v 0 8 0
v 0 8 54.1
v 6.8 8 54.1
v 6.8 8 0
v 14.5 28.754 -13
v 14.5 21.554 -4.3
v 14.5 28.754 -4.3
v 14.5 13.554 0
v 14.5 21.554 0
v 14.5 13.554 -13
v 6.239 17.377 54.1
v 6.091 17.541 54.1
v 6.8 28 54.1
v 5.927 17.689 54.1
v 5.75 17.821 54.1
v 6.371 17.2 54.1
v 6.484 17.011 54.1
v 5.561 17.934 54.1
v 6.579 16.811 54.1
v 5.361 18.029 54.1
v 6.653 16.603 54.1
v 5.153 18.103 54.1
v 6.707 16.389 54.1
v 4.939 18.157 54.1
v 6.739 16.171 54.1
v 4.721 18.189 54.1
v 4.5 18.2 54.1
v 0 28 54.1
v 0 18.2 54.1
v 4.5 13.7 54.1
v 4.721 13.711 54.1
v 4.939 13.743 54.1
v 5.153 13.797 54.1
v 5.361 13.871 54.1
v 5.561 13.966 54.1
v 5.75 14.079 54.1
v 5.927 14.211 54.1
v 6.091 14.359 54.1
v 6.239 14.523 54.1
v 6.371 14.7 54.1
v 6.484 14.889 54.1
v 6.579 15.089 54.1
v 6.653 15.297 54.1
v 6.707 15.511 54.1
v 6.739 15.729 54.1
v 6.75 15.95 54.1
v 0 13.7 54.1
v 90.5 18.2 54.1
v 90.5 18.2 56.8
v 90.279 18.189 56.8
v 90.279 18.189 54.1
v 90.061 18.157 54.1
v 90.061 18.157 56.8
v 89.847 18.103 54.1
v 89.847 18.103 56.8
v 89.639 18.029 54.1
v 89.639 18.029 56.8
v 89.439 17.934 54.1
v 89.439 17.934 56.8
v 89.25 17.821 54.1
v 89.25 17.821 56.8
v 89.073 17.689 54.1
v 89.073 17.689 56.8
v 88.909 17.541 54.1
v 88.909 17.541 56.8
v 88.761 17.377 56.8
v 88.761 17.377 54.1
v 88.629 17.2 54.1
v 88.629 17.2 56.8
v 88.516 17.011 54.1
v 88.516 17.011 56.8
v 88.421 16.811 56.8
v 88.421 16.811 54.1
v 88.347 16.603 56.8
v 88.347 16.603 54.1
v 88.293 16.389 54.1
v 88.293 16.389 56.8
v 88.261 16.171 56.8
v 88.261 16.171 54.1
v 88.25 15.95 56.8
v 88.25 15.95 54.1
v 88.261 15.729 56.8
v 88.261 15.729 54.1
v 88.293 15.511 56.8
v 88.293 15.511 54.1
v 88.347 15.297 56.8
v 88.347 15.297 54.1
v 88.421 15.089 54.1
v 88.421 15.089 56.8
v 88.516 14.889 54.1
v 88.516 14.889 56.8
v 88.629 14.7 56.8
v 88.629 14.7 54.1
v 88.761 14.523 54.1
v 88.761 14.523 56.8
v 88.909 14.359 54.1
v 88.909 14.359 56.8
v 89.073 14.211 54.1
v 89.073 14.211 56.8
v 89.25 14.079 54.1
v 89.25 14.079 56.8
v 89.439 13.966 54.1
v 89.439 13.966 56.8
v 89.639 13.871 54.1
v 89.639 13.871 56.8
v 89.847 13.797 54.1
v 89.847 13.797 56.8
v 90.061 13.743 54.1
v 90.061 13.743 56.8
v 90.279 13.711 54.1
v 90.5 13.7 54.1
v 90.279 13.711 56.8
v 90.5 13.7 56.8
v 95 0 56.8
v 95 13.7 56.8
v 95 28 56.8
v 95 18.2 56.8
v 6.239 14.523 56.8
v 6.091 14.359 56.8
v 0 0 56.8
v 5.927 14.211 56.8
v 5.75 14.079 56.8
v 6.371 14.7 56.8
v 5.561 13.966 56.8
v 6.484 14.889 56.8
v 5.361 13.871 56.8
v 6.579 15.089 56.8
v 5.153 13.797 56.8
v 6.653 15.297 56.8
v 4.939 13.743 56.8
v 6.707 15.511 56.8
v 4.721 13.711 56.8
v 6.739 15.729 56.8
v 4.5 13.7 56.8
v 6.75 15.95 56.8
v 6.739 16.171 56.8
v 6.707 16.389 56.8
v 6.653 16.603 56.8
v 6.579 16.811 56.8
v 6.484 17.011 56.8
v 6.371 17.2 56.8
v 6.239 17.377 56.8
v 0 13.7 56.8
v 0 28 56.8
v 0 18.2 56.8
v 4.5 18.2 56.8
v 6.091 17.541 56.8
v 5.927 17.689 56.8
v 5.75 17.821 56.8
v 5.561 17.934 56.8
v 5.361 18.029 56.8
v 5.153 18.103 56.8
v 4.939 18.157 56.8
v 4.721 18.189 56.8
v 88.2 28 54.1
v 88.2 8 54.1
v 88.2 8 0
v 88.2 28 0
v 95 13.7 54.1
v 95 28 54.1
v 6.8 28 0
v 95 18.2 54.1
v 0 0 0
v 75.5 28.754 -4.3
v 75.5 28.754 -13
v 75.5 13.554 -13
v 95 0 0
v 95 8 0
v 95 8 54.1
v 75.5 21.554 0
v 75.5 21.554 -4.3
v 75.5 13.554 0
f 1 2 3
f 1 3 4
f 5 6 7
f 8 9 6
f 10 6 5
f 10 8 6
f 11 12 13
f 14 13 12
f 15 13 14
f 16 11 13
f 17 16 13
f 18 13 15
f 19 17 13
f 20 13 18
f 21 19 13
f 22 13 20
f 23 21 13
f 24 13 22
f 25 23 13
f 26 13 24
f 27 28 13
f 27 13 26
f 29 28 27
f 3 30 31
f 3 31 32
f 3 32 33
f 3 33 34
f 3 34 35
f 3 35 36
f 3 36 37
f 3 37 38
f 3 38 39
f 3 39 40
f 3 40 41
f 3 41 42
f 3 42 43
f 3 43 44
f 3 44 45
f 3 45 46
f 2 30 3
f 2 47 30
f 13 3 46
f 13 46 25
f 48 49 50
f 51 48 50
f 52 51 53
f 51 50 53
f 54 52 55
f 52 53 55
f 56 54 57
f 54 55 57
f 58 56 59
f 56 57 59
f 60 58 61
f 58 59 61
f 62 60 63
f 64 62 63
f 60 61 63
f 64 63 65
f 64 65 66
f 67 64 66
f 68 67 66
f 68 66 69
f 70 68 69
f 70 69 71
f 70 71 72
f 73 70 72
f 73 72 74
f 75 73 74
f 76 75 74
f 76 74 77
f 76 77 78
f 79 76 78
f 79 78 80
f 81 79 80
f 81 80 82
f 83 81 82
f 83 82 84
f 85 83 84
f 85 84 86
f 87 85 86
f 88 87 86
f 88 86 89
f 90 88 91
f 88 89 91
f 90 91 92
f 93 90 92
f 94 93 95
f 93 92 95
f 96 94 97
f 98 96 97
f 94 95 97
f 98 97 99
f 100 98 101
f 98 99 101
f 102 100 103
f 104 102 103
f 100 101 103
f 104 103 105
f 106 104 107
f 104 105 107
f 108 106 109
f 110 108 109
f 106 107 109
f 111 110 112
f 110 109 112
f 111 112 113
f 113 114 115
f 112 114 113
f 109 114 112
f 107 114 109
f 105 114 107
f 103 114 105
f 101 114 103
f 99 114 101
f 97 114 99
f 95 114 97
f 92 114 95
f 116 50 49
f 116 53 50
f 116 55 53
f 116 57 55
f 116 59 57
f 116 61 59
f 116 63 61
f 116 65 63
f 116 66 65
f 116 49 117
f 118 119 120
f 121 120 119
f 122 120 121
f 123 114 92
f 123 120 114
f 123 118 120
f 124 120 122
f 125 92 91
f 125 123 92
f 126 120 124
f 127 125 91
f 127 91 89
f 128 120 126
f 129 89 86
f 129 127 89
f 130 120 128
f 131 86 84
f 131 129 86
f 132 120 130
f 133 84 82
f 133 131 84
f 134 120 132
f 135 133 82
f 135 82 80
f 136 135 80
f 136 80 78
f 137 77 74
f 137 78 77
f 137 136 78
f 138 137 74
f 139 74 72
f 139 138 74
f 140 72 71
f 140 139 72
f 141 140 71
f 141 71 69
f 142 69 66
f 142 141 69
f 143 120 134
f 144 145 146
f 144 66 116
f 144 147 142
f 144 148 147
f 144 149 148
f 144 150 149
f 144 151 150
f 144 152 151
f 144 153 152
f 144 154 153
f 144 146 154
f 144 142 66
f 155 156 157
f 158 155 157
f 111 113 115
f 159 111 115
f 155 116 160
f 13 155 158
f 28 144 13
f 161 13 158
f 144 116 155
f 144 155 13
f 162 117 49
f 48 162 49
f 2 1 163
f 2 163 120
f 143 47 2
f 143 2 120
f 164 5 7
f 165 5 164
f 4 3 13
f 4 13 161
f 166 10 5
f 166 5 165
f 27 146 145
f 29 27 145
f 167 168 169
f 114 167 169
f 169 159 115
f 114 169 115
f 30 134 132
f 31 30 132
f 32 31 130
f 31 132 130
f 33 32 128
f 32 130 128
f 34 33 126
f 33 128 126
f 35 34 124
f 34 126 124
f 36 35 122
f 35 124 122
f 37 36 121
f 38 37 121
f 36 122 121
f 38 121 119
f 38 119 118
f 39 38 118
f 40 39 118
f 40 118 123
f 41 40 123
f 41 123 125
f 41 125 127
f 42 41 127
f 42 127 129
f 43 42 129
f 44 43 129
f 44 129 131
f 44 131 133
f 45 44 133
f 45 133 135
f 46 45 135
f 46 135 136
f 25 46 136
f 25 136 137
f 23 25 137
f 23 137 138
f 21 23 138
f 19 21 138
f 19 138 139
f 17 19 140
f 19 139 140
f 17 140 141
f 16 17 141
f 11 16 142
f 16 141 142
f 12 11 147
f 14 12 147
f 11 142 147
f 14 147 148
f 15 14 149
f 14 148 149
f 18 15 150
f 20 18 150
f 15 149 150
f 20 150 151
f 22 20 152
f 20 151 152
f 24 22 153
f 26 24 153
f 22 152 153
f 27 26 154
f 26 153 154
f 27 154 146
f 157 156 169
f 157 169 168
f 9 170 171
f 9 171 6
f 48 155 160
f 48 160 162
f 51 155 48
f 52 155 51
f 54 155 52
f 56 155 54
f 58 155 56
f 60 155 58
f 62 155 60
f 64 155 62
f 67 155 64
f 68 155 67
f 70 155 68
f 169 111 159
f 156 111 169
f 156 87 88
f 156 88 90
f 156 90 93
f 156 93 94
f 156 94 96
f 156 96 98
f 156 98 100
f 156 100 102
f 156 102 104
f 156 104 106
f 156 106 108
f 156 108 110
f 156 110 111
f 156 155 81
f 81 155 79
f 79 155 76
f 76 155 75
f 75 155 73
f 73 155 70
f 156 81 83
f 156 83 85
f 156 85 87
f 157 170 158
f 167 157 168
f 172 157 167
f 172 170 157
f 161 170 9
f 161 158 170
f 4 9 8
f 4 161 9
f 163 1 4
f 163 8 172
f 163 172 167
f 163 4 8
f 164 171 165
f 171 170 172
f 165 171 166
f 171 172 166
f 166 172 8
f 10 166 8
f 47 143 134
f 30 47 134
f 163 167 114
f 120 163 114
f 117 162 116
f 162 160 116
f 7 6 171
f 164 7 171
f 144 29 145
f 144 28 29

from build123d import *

# Parameters (mm, degrees)
EXTRUDE_1_DEPTH     = 95
SKETCH_2_W          = 81.4
SKETCH_2_H          = 54.1
EXTRUDE_2_DEPTH     = 20
SKETCH_3_W          = 61
SKETCH_3_H          = 8
EXTRUDE_3_DEPTH     = 13
SKETCH_4_W          = 61
SKETCH_4_H          = 8.7
EXTRUDE_4_DEPTH     = 7.2
CUT_EXTRUDE_1_DEPTH = 70.8


with BuildPart() as part:
    # 草图1 → 凸台-拉伸1 (new body)
    with BuildSketch(Plane(origin=(0, 0, 0), x_dir=(0, 0, -1), z_dir=(1, 0, 0))):
        Polygon((0, 0), (-56.8, 0), (-56.8, 28), (-54.1, 28), (-54.1, 8), (0, 8), align=None)
    extrude(amount=EXTRUDE_1_DEPTH)

    # 草图2 → 凸台-拉伸2 (add)
    with BuildSketch(Plane(origin=(0, 8, 0), x_dir=(1, 0, 0), z_dir=(0, 1, 0))):
        with Locations((47.5, -27.05)):
            Rectangle(SKETCH_2_W, SKETCH_2_H)
    extrude(amount=EXTRUDE_2_DEPTH)

    # 草图3 → 凸台-拉伸3 (add)
    with BuildSketch(Plane(origin=(0, 0, 0), x_dir=(-1, 0, 0), z_dir=(0, 0, -1))):
        with Locations((-45, 17.553614205)):
            Rectangle(SKETCH_3_W, SKETCH_3_H)
    extrude(amount=EXTRUDE_3_DEPTH)

    # 草图4 → 凸台-拉伸4 (add)
    with BuildSketch(Plane(origin=(0, 21.553614205, 0), x_dir=(1, 0, 0), z_dir=(0, 1, 0))):
        with Locations((45, 8.65)):
            Rectangle(SKETCH_4_W, SKETCH_4_H)
    extrude(amount=EXTRUDE_4_DEPTH)

    # 草图7 → 切除-拉伸1 (cut, through all)
    with BuildSketch(Plane.XY.offset(56.8)):
        with BuildLine():
            Line((4.5, 18.2), (0, 18.2))
            Line((0, 18.2), (0, 13.7))
            Line((0, 13.7), (4.5, 13.7))
            ThreePointArc((4.5, 13.7), (6.75, 15.95), (4.5, 18.2))
        make_face()
        with BuildLine():
            Line((90.5, 13.7), (95, 13.7))
            Line((95, 13.7), (95, 18.2))
            Line((95, 18.2), (90.5, 18.2))
            ThreePointArc((90.5, 18.2), (88.25, 15.95), (90.5, 13.7))
        make_face()
    extrude(amount=-CUT_EXTRUDE_1_DEPTH, mode=Mode.SUBTRACT)


solid = part.part
